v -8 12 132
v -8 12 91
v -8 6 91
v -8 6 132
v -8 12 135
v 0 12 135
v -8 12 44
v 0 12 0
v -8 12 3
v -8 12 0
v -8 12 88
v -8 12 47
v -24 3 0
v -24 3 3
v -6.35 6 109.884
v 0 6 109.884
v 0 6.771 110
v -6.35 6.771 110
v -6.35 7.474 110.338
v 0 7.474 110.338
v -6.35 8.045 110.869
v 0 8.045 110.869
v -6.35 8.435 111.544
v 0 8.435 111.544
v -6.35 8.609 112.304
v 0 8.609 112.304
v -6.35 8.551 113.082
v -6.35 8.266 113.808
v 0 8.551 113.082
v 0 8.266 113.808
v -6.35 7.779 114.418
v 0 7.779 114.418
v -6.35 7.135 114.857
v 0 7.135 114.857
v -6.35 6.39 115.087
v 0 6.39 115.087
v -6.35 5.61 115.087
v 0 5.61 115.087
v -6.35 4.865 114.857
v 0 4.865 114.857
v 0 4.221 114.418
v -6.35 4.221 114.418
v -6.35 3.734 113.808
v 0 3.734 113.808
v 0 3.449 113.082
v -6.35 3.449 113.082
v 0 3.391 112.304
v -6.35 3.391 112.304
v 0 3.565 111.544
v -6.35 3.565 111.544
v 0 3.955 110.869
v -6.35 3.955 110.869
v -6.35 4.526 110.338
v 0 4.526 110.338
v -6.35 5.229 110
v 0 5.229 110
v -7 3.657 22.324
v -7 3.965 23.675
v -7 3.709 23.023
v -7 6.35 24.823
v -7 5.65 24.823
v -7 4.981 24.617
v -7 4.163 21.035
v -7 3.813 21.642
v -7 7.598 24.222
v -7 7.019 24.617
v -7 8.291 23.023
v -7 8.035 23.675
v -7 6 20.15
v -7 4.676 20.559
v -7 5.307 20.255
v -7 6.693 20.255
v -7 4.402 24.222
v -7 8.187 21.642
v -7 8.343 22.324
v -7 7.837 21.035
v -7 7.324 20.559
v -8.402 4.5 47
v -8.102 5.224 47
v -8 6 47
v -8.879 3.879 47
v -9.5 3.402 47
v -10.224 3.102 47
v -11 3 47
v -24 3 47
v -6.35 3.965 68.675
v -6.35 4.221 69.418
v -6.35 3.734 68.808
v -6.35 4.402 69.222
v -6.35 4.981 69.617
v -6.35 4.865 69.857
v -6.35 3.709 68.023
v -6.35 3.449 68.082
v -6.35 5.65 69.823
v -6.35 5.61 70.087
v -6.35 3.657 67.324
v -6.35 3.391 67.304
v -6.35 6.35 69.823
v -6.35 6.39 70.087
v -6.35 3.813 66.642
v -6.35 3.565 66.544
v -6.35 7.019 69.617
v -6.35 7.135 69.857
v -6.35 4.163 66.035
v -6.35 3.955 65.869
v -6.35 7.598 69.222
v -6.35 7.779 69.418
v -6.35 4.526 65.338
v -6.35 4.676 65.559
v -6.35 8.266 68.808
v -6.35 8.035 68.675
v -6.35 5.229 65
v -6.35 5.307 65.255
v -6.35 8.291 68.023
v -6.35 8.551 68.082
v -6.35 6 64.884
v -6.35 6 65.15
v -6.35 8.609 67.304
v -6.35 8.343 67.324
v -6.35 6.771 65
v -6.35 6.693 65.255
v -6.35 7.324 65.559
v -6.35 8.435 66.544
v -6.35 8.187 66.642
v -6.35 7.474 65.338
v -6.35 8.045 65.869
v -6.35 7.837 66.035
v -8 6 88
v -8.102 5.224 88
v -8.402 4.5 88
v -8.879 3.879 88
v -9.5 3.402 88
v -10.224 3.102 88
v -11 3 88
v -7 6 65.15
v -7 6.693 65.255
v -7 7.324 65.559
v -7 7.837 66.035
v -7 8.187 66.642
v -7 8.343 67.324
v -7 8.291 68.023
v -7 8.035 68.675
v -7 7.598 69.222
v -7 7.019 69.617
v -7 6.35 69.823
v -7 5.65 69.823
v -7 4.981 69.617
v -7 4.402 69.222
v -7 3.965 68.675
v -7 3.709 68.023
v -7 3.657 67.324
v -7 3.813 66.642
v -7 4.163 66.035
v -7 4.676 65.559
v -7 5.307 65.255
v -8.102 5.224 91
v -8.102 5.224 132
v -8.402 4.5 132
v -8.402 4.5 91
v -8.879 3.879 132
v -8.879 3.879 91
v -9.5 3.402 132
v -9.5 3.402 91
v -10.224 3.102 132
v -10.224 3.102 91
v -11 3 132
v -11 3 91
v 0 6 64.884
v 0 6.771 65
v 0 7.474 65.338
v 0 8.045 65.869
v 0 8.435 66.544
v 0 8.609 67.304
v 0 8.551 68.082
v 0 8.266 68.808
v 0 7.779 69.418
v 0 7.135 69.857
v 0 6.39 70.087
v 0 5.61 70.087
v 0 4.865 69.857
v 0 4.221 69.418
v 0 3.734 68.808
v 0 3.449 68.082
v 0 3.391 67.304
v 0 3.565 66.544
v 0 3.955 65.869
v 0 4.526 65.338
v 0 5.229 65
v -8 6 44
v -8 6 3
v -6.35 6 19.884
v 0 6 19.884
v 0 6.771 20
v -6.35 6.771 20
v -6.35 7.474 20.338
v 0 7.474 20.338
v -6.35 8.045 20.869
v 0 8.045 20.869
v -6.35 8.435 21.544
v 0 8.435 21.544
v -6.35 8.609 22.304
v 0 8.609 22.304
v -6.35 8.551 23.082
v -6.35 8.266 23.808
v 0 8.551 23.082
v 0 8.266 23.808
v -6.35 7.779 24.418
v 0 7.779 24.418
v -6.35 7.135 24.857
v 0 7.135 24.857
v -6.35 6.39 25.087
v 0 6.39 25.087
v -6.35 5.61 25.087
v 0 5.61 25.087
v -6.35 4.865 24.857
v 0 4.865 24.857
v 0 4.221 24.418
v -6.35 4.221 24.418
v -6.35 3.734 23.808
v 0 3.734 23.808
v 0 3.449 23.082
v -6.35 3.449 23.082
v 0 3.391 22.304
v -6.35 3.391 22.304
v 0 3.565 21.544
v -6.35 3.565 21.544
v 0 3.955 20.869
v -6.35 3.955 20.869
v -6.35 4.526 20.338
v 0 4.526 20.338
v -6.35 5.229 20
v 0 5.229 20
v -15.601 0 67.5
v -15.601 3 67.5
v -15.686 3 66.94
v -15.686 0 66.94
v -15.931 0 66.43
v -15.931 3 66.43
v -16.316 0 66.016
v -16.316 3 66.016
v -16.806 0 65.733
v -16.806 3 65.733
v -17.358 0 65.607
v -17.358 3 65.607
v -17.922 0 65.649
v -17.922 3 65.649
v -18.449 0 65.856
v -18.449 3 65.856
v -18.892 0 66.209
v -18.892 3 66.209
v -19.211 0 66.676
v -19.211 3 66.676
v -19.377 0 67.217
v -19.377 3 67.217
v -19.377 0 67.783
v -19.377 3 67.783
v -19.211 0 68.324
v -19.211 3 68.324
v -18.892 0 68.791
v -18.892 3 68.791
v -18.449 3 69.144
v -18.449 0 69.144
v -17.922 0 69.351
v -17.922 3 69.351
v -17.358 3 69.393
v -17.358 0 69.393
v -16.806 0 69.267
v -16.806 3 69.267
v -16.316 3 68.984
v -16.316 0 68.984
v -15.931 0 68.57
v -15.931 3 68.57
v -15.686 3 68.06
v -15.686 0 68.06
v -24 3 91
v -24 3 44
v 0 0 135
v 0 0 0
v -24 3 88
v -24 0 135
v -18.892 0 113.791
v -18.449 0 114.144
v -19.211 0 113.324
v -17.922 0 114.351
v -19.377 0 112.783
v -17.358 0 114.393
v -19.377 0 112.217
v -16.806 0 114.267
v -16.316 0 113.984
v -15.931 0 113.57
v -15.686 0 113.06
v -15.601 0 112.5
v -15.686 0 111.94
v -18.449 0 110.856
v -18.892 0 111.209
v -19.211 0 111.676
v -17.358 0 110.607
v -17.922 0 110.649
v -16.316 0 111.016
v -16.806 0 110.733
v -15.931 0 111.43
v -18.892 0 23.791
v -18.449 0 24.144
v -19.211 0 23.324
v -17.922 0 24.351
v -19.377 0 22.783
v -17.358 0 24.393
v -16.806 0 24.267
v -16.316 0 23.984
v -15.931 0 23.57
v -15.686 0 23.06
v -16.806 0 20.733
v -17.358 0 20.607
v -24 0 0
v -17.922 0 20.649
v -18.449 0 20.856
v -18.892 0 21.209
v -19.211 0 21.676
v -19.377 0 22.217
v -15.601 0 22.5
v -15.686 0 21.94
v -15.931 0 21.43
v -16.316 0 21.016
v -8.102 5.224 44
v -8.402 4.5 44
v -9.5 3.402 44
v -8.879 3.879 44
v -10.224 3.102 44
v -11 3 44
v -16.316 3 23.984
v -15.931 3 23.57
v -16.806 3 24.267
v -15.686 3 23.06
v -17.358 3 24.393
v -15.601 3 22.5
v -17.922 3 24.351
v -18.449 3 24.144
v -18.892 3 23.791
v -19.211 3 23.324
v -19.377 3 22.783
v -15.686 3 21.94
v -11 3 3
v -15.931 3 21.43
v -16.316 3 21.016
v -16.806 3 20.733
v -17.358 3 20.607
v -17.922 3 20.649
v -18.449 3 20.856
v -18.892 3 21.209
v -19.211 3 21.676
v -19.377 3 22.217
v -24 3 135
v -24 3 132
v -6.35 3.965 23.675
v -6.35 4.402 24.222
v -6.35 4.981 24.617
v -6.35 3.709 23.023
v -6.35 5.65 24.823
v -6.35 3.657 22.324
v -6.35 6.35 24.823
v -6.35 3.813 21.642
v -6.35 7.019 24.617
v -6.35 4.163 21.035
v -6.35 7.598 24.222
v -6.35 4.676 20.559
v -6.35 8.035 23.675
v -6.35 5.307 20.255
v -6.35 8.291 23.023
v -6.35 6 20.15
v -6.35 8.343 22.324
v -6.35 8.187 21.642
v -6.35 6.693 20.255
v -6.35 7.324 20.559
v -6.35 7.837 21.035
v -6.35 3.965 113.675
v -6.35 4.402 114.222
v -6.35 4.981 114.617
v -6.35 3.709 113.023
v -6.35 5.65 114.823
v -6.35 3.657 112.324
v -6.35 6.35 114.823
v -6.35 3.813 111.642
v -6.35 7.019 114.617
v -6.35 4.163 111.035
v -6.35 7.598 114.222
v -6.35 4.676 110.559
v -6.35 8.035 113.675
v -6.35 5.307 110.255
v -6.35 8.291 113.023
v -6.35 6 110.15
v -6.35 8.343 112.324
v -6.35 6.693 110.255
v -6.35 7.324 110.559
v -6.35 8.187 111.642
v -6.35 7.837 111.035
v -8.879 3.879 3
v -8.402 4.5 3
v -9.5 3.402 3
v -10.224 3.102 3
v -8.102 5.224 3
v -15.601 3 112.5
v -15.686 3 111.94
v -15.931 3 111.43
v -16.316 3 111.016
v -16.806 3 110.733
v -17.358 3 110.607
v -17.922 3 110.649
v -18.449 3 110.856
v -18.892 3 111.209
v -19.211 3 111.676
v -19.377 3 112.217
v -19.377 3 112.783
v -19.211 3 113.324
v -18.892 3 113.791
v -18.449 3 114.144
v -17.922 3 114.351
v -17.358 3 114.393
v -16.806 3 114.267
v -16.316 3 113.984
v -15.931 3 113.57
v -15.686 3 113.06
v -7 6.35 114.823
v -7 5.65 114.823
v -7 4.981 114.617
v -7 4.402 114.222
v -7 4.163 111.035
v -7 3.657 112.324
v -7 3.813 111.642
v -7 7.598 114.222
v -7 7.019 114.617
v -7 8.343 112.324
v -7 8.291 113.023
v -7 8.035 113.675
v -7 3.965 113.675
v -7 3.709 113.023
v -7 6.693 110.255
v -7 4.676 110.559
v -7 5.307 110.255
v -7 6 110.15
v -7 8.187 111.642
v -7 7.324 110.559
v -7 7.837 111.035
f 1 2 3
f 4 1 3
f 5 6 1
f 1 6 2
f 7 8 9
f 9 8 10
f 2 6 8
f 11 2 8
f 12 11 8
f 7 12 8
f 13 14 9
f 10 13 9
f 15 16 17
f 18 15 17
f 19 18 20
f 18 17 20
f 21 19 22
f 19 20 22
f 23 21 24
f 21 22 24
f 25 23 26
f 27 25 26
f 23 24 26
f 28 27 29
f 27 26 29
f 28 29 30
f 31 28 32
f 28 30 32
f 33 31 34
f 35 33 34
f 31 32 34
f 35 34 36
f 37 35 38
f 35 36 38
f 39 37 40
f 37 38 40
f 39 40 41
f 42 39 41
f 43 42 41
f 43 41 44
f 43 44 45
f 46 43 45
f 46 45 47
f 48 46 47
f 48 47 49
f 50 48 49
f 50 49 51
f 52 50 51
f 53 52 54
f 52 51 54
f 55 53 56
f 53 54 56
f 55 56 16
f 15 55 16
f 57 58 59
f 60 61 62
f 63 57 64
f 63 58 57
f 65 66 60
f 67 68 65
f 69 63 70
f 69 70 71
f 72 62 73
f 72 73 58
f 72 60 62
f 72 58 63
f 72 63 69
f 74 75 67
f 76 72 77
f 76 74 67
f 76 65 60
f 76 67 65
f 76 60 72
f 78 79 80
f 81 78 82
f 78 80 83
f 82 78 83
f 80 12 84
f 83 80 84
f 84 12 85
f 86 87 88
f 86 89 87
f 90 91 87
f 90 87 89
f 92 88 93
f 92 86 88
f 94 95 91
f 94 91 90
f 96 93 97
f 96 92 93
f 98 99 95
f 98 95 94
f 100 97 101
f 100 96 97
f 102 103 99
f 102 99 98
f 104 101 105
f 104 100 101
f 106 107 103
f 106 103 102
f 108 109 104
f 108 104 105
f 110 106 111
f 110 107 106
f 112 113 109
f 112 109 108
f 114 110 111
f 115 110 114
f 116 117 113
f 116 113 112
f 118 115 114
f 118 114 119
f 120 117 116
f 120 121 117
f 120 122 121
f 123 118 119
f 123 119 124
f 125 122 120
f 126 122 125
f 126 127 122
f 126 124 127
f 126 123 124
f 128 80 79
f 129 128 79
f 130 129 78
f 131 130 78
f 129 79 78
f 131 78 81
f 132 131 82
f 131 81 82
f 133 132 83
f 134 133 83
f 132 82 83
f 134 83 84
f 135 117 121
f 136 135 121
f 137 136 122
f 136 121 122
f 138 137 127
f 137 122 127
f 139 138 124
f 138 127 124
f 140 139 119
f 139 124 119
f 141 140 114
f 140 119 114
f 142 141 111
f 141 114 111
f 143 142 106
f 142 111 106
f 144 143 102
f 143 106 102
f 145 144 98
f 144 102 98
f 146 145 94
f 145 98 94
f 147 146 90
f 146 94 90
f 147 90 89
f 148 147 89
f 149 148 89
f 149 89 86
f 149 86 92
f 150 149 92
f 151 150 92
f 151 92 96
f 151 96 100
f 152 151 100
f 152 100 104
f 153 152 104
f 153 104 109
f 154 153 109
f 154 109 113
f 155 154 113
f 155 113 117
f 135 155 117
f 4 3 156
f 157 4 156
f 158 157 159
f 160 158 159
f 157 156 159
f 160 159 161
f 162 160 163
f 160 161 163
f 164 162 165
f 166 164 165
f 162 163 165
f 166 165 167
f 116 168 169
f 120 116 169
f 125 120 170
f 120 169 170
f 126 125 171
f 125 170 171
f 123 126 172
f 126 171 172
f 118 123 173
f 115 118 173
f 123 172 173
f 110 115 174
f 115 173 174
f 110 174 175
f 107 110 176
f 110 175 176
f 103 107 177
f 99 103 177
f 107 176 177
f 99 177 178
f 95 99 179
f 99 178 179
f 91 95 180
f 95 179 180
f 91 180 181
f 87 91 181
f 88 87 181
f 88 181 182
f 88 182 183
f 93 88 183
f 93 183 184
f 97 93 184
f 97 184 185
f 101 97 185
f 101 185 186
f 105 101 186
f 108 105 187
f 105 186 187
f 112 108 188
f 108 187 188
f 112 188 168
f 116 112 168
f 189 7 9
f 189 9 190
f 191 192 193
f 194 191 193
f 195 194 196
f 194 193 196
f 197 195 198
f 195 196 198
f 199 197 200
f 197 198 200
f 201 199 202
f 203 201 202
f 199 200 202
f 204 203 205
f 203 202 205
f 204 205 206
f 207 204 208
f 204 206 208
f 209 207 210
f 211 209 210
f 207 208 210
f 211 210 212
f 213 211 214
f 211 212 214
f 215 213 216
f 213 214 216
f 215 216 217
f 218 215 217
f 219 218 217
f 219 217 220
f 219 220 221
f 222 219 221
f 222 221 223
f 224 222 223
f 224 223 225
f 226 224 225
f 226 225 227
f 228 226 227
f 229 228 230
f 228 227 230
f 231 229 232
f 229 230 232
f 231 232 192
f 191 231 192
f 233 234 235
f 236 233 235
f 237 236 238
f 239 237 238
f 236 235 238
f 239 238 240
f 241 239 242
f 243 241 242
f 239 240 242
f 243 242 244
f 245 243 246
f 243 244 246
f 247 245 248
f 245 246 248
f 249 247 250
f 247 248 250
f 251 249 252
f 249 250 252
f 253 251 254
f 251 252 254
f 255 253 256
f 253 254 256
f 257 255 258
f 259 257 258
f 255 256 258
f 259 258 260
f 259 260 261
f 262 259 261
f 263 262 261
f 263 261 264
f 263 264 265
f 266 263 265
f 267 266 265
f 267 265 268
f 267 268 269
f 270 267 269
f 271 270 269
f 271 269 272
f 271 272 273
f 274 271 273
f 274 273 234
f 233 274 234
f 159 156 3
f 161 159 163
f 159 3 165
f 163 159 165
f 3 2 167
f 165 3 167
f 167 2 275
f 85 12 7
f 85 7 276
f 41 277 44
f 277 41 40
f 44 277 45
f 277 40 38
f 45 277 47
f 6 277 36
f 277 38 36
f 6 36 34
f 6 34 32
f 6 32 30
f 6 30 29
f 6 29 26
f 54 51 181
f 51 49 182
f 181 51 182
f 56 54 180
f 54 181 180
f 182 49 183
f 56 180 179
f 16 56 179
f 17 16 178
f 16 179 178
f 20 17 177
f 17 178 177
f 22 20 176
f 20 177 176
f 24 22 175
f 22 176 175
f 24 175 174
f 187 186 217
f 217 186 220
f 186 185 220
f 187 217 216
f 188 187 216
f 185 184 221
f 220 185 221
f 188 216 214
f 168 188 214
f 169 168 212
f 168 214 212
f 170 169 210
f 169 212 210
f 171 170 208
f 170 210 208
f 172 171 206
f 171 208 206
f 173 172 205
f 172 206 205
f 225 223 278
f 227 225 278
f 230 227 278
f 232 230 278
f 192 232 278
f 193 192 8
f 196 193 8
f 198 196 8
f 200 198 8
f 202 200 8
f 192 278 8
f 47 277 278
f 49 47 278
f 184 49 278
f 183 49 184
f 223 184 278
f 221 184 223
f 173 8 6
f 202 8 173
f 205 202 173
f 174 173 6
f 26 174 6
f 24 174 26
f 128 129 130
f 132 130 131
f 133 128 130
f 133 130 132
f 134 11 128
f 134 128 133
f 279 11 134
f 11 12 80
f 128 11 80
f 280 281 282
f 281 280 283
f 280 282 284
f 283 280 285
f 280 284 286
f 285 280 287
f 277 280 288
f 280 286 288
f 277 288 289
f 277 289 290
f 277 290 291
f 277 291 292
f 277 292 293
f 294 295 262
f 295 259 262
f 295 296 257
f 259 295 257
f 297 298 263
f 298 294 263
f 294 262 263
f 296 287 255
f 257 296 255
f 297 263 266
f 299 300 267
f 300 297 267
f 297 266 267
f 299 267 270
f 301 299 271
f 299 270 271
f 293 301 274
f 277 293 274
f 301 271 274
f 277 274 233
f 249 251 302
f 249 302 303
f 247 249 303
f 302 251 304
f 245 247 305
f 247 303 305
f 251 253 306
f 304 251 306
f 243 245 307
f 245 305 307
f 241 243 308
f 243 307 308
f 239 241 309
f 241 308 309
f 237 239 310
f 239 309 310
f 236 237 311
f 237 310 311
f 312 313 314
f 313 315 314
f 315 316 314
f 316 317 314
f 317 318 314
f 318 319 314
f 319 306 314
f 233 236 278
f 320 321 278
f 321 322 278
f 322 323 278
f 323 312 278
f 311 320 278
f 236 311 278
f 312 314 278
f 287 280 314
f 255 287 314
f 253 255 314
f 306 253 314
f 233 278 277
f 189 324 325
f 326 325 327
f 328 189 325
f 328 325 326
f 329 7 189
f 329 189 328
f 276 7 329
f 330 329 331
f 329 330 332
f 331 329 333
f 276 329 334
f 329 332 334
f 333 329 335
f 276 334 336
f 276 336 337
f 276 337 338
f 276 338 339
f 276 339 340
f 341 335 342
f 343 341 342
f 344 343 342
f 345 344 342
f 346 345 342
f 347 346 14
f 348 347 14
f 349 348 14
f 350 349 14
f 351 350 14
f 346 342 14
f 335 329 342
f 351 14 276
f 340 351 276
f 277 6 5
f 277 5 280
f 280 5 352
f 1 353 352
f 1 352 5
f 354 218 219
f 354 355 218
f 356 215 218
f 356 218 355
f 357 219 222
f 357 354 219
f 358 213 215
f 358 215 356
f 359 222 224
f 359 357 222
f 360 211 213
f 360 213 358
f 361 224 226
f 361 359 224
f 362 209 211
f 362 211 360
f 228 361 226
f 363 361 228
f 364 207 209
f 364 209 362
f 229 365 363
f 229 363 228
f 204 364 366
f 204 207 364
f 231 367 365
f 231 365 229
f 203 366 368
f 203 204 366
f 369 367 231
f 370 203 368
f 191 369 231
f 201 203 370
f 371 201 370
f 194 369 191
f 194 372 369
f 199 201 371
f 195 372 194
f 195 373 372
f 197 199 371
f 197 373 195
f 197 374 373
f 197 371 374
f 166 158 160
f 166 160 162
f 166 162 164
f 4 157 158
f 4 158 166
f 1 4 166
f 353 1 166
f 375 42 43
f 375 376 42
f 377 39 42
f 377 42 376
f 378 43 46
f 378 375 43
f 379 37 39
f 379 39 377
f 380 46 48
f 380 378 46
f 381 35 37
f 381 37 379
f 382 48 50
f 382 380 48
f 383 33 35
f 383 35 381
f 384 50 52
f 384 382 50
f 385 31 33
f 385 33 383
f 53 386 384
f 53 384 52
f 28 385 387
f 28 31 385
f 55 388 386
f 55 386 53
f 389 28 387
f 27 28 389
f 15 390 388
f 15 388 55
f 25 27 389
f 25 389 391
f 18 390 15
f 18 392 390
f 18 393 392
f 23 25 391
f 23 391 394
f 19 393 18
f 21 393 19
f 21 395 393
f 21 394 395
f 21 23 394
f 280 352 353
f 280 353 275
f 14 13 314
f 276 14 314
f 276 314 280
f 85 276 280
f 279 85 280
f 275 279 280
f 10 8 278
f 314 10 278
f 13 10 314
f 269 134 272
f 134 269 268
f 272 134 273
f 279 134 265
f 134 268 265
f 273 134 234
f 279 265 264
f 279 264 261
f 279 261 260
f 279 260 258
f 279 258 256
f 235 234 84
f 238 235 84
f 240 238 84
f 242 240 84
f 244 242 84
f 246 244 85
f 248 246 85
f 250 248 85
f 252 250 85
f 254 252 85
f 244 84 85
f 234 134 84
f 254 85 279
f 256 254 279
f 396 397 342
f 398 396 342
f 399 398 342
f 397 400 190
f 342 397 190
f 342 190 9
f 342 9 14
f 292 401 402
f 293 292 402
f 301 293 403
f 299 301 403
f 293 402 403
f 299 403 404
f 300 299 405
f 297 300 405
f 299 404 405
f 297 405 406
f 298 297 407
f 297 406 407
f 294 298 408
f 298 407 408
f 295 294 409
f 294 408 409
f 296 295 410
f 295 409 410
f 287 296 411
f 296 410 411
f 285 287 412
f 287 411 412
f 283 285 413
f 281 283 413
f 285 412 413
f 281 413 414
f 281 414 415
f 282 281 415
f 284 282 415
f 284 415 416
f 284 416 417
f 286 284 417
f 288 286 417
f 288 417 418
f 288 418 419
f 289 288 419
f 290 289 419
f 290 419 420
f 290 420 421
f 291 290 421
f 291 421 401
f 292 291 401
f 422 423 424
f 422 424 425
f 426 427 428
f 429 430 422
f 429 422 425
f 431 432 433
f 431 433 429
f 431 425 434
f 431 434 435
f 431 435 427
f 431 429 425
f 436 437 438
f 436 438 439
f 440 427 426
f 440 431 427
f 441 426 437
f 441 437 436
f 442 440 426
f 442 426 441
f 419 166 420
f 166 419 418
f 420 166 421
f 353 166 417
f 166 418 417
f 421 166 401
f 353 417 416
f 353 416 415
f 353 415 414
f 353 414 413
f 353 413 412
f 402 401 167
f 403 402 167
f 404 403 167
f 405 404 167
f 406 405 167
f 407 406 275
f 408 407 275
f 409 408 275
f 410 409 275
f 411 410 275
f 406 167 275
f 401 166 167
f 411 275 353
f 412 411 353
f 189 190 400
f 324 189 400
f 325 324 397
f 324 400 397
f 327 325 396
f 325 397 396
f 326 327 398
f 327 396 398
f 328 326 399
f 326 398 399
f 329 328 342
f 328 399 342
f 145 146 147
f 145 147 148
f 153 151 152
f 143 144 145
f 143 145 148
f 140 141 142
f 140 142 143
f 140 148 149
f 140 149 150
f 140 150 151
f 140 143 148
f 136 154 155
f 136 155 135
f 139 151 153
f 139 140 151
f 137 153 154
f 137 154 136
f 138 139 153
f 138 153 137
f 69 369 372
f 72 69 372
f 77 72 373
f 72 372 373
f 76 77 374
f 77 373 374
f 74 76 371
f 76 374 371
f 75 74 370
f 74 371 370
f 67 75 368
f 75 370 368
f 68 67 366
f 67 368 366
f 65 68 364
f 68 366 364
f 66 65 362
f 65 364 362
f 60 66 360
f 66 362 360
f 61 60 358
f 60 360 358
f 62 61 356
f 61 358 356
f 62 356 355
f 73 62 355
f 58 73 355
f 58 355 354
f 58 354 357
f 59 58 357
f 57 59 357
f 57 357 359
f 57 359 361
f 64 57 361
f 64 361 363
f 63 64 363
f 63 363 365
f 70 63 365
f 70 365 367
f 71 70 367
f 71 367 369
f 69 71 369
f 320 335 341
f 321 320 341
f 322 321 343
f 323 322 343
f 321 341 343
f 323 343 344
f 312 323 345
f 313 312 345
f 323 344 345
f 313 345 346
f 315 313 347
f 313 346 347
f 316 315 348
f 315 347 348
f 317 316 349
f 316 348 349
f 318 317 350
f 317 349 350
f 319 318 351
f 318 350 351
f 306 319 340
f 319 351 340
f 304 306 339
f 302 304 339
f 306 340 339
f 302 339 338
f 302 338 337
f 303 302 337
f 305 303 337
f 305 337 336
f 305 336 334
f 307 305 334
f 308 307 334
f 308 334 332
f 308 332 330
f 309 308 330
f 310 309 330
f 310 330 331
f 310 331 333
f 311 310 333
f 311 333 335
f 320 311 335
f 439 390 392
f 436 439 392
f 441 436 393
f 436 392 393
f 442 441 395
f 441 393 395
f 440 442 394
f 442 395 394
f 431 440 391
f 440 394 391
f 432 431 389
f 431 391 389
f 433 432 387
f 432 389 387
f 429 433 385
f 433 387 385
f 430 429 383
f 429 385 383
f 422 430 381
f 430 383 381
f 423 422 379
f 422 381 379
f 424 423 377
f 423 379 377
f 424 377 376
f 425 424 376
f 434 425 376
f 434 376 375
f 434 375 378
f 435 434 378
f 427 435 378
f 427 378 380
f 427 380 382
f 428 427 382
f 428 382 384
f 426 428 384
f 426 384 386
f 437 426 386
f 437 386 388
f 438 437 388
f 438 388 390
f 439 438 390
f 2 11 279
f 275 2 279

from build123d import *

# Parameters (mm, degrees)
BOSS_EXTRUDE1_DEPTH   = 135
RIB3_REACH            = 95.436
SKETCH4_WALL_W        = 207.229173432
SKETCH4_WALL_H        = 3
RIB4_START            = -3
RIB4_DEPTH            = 3
F_6_CLEARANCE_HOLE1_D = 3.7973
SKETCH6_R             = 2.3495
CUT_EXTRUDE1_DEPTH    = 7
SKETCH12_R            = 2.6162
CUT_EXTRUDE2_DEPTH    = 6.35


# Read off the part's stored shape, not the designer's step: Rib4
with BuildPart() as part:
    # Sketch1 → Boss-Extrude1 (new body)
    with BuildSketch(Plane.XY):
        with BuildLine():
            Line((0, 0), (0, 12))
            Line((0, 12), (-8, 12))
            Line((-8, 12), (-8, 6))
            ThreePointArc((-8, 6), (-8.878679656, 3.878679656), (-11, 3))
            Line((-11, 3), (-24, 3))
            Line((-24, 3), (-24, 0))
            Line((-24, 0), (0, 0))
        make_face()
    extrude(amount=BOSS_EXTRUDE1_DEPTH)

    # Sketch4 wall → Rib3 (add, up to next)
    with BuildSketch(Plane(origin=(-16, 7.5, 45.5), x_dir=(-0.871575537125, -0.490261239633, 0), z_dir=(-0.490261239633, 0.871575537125, 0)), mode=Mode.PRIVATE) as rib3_sk1:
        Rectangle(SKETCH4_WALL_W, SKETCH4_WALL_H)
    rib3_tool1 = extrude(rib3_sk1.sketch, amount=-RIB3_REACH, mode=Mode.PRIVATE) - part.part
    rib3 = rib3_tool1.solids().sort_by_distance((-16, 7.5, 45.5))[0]
    add(rib3)

    # Rib4 outline → Rib4 (add)
    with BuildSketch(Plane(origin=(0, 0, 0), x_dir=(-1, 0, 0), z_dir=(0, 0, -1)).offset(RIB4_START)):
        with BuildLine():
            Line((24, 3), (8, 12))
            Line((8, 12), (8, 6))
            ThreePointArc((8, 6), (8.878679656, 3.878679656), (11, 3))
            Line((11, 3), (24, 3))
        make_face()
    rib4 = extrude(amount=RIB4_DEPTH)

    # Mirror1: Rib3, Rib4 across plane
    add(rib3.mirror(Plane(origin=(0, 0, 67.5), x_dir=(1, 0, 0), z_dir=(0, 0, -1))))
    add(rib4.mirror(Plane(origin=(0, 0, 67.5), x_dir=(1, 0, 0), z_dir=(0, 0, -1))))

    # #6 Clearance Hole1 (through all)
    with Locations(Plane(origin=(0, 0, 0), x_dir=(-1, 0, 0), z_dir=(0, -1, 0))):
        with Locations((17.5, -22.5), (17.5, -112.5), (17.5, -67.5)):
            Hole(F_6_CLEARANCE_HOLE1_D / 2)

    # Sketch6 → Cut-Extrude1 (cut)
    with BuildSketch(Plane(origin=(0, 0, 0), x_dir=(0, 0, -1), z_dir=(1, 0, 0))):
        with Locations((-112.5, 6)):
            Circle(SKETCH6_R)
        with Locations((-67.5, 6)):
            Circle(SKETCH6_R)
        with Locations((-22.5, 6)):
            Circle(SKETCH6_R)
    extrude(amount=-CUT_EXTRUDE1_DEPTH, mode=Mode.SUBTRACT)

    # Sketch12 → Cut-Extrude2 (cut)
    with BuildSketch(Plane(origin=(0, 0, 0), x_dir=(0, 0, -1), z_dir=(1, 0, 0))):
        with Locations((-112.5, 6)):
            Circle(SKETCH12_R)
        with Locations((-67.5, 6)):
            Circle(SKETCH12_R)
        with Locations((-22.5, 6)):
            Circle(SKETCH12_R)
    extrude(amount=-CUT_EXTRUDE2_DEPTH, mode=Mode.SUBTRACT)


solid = part.part
